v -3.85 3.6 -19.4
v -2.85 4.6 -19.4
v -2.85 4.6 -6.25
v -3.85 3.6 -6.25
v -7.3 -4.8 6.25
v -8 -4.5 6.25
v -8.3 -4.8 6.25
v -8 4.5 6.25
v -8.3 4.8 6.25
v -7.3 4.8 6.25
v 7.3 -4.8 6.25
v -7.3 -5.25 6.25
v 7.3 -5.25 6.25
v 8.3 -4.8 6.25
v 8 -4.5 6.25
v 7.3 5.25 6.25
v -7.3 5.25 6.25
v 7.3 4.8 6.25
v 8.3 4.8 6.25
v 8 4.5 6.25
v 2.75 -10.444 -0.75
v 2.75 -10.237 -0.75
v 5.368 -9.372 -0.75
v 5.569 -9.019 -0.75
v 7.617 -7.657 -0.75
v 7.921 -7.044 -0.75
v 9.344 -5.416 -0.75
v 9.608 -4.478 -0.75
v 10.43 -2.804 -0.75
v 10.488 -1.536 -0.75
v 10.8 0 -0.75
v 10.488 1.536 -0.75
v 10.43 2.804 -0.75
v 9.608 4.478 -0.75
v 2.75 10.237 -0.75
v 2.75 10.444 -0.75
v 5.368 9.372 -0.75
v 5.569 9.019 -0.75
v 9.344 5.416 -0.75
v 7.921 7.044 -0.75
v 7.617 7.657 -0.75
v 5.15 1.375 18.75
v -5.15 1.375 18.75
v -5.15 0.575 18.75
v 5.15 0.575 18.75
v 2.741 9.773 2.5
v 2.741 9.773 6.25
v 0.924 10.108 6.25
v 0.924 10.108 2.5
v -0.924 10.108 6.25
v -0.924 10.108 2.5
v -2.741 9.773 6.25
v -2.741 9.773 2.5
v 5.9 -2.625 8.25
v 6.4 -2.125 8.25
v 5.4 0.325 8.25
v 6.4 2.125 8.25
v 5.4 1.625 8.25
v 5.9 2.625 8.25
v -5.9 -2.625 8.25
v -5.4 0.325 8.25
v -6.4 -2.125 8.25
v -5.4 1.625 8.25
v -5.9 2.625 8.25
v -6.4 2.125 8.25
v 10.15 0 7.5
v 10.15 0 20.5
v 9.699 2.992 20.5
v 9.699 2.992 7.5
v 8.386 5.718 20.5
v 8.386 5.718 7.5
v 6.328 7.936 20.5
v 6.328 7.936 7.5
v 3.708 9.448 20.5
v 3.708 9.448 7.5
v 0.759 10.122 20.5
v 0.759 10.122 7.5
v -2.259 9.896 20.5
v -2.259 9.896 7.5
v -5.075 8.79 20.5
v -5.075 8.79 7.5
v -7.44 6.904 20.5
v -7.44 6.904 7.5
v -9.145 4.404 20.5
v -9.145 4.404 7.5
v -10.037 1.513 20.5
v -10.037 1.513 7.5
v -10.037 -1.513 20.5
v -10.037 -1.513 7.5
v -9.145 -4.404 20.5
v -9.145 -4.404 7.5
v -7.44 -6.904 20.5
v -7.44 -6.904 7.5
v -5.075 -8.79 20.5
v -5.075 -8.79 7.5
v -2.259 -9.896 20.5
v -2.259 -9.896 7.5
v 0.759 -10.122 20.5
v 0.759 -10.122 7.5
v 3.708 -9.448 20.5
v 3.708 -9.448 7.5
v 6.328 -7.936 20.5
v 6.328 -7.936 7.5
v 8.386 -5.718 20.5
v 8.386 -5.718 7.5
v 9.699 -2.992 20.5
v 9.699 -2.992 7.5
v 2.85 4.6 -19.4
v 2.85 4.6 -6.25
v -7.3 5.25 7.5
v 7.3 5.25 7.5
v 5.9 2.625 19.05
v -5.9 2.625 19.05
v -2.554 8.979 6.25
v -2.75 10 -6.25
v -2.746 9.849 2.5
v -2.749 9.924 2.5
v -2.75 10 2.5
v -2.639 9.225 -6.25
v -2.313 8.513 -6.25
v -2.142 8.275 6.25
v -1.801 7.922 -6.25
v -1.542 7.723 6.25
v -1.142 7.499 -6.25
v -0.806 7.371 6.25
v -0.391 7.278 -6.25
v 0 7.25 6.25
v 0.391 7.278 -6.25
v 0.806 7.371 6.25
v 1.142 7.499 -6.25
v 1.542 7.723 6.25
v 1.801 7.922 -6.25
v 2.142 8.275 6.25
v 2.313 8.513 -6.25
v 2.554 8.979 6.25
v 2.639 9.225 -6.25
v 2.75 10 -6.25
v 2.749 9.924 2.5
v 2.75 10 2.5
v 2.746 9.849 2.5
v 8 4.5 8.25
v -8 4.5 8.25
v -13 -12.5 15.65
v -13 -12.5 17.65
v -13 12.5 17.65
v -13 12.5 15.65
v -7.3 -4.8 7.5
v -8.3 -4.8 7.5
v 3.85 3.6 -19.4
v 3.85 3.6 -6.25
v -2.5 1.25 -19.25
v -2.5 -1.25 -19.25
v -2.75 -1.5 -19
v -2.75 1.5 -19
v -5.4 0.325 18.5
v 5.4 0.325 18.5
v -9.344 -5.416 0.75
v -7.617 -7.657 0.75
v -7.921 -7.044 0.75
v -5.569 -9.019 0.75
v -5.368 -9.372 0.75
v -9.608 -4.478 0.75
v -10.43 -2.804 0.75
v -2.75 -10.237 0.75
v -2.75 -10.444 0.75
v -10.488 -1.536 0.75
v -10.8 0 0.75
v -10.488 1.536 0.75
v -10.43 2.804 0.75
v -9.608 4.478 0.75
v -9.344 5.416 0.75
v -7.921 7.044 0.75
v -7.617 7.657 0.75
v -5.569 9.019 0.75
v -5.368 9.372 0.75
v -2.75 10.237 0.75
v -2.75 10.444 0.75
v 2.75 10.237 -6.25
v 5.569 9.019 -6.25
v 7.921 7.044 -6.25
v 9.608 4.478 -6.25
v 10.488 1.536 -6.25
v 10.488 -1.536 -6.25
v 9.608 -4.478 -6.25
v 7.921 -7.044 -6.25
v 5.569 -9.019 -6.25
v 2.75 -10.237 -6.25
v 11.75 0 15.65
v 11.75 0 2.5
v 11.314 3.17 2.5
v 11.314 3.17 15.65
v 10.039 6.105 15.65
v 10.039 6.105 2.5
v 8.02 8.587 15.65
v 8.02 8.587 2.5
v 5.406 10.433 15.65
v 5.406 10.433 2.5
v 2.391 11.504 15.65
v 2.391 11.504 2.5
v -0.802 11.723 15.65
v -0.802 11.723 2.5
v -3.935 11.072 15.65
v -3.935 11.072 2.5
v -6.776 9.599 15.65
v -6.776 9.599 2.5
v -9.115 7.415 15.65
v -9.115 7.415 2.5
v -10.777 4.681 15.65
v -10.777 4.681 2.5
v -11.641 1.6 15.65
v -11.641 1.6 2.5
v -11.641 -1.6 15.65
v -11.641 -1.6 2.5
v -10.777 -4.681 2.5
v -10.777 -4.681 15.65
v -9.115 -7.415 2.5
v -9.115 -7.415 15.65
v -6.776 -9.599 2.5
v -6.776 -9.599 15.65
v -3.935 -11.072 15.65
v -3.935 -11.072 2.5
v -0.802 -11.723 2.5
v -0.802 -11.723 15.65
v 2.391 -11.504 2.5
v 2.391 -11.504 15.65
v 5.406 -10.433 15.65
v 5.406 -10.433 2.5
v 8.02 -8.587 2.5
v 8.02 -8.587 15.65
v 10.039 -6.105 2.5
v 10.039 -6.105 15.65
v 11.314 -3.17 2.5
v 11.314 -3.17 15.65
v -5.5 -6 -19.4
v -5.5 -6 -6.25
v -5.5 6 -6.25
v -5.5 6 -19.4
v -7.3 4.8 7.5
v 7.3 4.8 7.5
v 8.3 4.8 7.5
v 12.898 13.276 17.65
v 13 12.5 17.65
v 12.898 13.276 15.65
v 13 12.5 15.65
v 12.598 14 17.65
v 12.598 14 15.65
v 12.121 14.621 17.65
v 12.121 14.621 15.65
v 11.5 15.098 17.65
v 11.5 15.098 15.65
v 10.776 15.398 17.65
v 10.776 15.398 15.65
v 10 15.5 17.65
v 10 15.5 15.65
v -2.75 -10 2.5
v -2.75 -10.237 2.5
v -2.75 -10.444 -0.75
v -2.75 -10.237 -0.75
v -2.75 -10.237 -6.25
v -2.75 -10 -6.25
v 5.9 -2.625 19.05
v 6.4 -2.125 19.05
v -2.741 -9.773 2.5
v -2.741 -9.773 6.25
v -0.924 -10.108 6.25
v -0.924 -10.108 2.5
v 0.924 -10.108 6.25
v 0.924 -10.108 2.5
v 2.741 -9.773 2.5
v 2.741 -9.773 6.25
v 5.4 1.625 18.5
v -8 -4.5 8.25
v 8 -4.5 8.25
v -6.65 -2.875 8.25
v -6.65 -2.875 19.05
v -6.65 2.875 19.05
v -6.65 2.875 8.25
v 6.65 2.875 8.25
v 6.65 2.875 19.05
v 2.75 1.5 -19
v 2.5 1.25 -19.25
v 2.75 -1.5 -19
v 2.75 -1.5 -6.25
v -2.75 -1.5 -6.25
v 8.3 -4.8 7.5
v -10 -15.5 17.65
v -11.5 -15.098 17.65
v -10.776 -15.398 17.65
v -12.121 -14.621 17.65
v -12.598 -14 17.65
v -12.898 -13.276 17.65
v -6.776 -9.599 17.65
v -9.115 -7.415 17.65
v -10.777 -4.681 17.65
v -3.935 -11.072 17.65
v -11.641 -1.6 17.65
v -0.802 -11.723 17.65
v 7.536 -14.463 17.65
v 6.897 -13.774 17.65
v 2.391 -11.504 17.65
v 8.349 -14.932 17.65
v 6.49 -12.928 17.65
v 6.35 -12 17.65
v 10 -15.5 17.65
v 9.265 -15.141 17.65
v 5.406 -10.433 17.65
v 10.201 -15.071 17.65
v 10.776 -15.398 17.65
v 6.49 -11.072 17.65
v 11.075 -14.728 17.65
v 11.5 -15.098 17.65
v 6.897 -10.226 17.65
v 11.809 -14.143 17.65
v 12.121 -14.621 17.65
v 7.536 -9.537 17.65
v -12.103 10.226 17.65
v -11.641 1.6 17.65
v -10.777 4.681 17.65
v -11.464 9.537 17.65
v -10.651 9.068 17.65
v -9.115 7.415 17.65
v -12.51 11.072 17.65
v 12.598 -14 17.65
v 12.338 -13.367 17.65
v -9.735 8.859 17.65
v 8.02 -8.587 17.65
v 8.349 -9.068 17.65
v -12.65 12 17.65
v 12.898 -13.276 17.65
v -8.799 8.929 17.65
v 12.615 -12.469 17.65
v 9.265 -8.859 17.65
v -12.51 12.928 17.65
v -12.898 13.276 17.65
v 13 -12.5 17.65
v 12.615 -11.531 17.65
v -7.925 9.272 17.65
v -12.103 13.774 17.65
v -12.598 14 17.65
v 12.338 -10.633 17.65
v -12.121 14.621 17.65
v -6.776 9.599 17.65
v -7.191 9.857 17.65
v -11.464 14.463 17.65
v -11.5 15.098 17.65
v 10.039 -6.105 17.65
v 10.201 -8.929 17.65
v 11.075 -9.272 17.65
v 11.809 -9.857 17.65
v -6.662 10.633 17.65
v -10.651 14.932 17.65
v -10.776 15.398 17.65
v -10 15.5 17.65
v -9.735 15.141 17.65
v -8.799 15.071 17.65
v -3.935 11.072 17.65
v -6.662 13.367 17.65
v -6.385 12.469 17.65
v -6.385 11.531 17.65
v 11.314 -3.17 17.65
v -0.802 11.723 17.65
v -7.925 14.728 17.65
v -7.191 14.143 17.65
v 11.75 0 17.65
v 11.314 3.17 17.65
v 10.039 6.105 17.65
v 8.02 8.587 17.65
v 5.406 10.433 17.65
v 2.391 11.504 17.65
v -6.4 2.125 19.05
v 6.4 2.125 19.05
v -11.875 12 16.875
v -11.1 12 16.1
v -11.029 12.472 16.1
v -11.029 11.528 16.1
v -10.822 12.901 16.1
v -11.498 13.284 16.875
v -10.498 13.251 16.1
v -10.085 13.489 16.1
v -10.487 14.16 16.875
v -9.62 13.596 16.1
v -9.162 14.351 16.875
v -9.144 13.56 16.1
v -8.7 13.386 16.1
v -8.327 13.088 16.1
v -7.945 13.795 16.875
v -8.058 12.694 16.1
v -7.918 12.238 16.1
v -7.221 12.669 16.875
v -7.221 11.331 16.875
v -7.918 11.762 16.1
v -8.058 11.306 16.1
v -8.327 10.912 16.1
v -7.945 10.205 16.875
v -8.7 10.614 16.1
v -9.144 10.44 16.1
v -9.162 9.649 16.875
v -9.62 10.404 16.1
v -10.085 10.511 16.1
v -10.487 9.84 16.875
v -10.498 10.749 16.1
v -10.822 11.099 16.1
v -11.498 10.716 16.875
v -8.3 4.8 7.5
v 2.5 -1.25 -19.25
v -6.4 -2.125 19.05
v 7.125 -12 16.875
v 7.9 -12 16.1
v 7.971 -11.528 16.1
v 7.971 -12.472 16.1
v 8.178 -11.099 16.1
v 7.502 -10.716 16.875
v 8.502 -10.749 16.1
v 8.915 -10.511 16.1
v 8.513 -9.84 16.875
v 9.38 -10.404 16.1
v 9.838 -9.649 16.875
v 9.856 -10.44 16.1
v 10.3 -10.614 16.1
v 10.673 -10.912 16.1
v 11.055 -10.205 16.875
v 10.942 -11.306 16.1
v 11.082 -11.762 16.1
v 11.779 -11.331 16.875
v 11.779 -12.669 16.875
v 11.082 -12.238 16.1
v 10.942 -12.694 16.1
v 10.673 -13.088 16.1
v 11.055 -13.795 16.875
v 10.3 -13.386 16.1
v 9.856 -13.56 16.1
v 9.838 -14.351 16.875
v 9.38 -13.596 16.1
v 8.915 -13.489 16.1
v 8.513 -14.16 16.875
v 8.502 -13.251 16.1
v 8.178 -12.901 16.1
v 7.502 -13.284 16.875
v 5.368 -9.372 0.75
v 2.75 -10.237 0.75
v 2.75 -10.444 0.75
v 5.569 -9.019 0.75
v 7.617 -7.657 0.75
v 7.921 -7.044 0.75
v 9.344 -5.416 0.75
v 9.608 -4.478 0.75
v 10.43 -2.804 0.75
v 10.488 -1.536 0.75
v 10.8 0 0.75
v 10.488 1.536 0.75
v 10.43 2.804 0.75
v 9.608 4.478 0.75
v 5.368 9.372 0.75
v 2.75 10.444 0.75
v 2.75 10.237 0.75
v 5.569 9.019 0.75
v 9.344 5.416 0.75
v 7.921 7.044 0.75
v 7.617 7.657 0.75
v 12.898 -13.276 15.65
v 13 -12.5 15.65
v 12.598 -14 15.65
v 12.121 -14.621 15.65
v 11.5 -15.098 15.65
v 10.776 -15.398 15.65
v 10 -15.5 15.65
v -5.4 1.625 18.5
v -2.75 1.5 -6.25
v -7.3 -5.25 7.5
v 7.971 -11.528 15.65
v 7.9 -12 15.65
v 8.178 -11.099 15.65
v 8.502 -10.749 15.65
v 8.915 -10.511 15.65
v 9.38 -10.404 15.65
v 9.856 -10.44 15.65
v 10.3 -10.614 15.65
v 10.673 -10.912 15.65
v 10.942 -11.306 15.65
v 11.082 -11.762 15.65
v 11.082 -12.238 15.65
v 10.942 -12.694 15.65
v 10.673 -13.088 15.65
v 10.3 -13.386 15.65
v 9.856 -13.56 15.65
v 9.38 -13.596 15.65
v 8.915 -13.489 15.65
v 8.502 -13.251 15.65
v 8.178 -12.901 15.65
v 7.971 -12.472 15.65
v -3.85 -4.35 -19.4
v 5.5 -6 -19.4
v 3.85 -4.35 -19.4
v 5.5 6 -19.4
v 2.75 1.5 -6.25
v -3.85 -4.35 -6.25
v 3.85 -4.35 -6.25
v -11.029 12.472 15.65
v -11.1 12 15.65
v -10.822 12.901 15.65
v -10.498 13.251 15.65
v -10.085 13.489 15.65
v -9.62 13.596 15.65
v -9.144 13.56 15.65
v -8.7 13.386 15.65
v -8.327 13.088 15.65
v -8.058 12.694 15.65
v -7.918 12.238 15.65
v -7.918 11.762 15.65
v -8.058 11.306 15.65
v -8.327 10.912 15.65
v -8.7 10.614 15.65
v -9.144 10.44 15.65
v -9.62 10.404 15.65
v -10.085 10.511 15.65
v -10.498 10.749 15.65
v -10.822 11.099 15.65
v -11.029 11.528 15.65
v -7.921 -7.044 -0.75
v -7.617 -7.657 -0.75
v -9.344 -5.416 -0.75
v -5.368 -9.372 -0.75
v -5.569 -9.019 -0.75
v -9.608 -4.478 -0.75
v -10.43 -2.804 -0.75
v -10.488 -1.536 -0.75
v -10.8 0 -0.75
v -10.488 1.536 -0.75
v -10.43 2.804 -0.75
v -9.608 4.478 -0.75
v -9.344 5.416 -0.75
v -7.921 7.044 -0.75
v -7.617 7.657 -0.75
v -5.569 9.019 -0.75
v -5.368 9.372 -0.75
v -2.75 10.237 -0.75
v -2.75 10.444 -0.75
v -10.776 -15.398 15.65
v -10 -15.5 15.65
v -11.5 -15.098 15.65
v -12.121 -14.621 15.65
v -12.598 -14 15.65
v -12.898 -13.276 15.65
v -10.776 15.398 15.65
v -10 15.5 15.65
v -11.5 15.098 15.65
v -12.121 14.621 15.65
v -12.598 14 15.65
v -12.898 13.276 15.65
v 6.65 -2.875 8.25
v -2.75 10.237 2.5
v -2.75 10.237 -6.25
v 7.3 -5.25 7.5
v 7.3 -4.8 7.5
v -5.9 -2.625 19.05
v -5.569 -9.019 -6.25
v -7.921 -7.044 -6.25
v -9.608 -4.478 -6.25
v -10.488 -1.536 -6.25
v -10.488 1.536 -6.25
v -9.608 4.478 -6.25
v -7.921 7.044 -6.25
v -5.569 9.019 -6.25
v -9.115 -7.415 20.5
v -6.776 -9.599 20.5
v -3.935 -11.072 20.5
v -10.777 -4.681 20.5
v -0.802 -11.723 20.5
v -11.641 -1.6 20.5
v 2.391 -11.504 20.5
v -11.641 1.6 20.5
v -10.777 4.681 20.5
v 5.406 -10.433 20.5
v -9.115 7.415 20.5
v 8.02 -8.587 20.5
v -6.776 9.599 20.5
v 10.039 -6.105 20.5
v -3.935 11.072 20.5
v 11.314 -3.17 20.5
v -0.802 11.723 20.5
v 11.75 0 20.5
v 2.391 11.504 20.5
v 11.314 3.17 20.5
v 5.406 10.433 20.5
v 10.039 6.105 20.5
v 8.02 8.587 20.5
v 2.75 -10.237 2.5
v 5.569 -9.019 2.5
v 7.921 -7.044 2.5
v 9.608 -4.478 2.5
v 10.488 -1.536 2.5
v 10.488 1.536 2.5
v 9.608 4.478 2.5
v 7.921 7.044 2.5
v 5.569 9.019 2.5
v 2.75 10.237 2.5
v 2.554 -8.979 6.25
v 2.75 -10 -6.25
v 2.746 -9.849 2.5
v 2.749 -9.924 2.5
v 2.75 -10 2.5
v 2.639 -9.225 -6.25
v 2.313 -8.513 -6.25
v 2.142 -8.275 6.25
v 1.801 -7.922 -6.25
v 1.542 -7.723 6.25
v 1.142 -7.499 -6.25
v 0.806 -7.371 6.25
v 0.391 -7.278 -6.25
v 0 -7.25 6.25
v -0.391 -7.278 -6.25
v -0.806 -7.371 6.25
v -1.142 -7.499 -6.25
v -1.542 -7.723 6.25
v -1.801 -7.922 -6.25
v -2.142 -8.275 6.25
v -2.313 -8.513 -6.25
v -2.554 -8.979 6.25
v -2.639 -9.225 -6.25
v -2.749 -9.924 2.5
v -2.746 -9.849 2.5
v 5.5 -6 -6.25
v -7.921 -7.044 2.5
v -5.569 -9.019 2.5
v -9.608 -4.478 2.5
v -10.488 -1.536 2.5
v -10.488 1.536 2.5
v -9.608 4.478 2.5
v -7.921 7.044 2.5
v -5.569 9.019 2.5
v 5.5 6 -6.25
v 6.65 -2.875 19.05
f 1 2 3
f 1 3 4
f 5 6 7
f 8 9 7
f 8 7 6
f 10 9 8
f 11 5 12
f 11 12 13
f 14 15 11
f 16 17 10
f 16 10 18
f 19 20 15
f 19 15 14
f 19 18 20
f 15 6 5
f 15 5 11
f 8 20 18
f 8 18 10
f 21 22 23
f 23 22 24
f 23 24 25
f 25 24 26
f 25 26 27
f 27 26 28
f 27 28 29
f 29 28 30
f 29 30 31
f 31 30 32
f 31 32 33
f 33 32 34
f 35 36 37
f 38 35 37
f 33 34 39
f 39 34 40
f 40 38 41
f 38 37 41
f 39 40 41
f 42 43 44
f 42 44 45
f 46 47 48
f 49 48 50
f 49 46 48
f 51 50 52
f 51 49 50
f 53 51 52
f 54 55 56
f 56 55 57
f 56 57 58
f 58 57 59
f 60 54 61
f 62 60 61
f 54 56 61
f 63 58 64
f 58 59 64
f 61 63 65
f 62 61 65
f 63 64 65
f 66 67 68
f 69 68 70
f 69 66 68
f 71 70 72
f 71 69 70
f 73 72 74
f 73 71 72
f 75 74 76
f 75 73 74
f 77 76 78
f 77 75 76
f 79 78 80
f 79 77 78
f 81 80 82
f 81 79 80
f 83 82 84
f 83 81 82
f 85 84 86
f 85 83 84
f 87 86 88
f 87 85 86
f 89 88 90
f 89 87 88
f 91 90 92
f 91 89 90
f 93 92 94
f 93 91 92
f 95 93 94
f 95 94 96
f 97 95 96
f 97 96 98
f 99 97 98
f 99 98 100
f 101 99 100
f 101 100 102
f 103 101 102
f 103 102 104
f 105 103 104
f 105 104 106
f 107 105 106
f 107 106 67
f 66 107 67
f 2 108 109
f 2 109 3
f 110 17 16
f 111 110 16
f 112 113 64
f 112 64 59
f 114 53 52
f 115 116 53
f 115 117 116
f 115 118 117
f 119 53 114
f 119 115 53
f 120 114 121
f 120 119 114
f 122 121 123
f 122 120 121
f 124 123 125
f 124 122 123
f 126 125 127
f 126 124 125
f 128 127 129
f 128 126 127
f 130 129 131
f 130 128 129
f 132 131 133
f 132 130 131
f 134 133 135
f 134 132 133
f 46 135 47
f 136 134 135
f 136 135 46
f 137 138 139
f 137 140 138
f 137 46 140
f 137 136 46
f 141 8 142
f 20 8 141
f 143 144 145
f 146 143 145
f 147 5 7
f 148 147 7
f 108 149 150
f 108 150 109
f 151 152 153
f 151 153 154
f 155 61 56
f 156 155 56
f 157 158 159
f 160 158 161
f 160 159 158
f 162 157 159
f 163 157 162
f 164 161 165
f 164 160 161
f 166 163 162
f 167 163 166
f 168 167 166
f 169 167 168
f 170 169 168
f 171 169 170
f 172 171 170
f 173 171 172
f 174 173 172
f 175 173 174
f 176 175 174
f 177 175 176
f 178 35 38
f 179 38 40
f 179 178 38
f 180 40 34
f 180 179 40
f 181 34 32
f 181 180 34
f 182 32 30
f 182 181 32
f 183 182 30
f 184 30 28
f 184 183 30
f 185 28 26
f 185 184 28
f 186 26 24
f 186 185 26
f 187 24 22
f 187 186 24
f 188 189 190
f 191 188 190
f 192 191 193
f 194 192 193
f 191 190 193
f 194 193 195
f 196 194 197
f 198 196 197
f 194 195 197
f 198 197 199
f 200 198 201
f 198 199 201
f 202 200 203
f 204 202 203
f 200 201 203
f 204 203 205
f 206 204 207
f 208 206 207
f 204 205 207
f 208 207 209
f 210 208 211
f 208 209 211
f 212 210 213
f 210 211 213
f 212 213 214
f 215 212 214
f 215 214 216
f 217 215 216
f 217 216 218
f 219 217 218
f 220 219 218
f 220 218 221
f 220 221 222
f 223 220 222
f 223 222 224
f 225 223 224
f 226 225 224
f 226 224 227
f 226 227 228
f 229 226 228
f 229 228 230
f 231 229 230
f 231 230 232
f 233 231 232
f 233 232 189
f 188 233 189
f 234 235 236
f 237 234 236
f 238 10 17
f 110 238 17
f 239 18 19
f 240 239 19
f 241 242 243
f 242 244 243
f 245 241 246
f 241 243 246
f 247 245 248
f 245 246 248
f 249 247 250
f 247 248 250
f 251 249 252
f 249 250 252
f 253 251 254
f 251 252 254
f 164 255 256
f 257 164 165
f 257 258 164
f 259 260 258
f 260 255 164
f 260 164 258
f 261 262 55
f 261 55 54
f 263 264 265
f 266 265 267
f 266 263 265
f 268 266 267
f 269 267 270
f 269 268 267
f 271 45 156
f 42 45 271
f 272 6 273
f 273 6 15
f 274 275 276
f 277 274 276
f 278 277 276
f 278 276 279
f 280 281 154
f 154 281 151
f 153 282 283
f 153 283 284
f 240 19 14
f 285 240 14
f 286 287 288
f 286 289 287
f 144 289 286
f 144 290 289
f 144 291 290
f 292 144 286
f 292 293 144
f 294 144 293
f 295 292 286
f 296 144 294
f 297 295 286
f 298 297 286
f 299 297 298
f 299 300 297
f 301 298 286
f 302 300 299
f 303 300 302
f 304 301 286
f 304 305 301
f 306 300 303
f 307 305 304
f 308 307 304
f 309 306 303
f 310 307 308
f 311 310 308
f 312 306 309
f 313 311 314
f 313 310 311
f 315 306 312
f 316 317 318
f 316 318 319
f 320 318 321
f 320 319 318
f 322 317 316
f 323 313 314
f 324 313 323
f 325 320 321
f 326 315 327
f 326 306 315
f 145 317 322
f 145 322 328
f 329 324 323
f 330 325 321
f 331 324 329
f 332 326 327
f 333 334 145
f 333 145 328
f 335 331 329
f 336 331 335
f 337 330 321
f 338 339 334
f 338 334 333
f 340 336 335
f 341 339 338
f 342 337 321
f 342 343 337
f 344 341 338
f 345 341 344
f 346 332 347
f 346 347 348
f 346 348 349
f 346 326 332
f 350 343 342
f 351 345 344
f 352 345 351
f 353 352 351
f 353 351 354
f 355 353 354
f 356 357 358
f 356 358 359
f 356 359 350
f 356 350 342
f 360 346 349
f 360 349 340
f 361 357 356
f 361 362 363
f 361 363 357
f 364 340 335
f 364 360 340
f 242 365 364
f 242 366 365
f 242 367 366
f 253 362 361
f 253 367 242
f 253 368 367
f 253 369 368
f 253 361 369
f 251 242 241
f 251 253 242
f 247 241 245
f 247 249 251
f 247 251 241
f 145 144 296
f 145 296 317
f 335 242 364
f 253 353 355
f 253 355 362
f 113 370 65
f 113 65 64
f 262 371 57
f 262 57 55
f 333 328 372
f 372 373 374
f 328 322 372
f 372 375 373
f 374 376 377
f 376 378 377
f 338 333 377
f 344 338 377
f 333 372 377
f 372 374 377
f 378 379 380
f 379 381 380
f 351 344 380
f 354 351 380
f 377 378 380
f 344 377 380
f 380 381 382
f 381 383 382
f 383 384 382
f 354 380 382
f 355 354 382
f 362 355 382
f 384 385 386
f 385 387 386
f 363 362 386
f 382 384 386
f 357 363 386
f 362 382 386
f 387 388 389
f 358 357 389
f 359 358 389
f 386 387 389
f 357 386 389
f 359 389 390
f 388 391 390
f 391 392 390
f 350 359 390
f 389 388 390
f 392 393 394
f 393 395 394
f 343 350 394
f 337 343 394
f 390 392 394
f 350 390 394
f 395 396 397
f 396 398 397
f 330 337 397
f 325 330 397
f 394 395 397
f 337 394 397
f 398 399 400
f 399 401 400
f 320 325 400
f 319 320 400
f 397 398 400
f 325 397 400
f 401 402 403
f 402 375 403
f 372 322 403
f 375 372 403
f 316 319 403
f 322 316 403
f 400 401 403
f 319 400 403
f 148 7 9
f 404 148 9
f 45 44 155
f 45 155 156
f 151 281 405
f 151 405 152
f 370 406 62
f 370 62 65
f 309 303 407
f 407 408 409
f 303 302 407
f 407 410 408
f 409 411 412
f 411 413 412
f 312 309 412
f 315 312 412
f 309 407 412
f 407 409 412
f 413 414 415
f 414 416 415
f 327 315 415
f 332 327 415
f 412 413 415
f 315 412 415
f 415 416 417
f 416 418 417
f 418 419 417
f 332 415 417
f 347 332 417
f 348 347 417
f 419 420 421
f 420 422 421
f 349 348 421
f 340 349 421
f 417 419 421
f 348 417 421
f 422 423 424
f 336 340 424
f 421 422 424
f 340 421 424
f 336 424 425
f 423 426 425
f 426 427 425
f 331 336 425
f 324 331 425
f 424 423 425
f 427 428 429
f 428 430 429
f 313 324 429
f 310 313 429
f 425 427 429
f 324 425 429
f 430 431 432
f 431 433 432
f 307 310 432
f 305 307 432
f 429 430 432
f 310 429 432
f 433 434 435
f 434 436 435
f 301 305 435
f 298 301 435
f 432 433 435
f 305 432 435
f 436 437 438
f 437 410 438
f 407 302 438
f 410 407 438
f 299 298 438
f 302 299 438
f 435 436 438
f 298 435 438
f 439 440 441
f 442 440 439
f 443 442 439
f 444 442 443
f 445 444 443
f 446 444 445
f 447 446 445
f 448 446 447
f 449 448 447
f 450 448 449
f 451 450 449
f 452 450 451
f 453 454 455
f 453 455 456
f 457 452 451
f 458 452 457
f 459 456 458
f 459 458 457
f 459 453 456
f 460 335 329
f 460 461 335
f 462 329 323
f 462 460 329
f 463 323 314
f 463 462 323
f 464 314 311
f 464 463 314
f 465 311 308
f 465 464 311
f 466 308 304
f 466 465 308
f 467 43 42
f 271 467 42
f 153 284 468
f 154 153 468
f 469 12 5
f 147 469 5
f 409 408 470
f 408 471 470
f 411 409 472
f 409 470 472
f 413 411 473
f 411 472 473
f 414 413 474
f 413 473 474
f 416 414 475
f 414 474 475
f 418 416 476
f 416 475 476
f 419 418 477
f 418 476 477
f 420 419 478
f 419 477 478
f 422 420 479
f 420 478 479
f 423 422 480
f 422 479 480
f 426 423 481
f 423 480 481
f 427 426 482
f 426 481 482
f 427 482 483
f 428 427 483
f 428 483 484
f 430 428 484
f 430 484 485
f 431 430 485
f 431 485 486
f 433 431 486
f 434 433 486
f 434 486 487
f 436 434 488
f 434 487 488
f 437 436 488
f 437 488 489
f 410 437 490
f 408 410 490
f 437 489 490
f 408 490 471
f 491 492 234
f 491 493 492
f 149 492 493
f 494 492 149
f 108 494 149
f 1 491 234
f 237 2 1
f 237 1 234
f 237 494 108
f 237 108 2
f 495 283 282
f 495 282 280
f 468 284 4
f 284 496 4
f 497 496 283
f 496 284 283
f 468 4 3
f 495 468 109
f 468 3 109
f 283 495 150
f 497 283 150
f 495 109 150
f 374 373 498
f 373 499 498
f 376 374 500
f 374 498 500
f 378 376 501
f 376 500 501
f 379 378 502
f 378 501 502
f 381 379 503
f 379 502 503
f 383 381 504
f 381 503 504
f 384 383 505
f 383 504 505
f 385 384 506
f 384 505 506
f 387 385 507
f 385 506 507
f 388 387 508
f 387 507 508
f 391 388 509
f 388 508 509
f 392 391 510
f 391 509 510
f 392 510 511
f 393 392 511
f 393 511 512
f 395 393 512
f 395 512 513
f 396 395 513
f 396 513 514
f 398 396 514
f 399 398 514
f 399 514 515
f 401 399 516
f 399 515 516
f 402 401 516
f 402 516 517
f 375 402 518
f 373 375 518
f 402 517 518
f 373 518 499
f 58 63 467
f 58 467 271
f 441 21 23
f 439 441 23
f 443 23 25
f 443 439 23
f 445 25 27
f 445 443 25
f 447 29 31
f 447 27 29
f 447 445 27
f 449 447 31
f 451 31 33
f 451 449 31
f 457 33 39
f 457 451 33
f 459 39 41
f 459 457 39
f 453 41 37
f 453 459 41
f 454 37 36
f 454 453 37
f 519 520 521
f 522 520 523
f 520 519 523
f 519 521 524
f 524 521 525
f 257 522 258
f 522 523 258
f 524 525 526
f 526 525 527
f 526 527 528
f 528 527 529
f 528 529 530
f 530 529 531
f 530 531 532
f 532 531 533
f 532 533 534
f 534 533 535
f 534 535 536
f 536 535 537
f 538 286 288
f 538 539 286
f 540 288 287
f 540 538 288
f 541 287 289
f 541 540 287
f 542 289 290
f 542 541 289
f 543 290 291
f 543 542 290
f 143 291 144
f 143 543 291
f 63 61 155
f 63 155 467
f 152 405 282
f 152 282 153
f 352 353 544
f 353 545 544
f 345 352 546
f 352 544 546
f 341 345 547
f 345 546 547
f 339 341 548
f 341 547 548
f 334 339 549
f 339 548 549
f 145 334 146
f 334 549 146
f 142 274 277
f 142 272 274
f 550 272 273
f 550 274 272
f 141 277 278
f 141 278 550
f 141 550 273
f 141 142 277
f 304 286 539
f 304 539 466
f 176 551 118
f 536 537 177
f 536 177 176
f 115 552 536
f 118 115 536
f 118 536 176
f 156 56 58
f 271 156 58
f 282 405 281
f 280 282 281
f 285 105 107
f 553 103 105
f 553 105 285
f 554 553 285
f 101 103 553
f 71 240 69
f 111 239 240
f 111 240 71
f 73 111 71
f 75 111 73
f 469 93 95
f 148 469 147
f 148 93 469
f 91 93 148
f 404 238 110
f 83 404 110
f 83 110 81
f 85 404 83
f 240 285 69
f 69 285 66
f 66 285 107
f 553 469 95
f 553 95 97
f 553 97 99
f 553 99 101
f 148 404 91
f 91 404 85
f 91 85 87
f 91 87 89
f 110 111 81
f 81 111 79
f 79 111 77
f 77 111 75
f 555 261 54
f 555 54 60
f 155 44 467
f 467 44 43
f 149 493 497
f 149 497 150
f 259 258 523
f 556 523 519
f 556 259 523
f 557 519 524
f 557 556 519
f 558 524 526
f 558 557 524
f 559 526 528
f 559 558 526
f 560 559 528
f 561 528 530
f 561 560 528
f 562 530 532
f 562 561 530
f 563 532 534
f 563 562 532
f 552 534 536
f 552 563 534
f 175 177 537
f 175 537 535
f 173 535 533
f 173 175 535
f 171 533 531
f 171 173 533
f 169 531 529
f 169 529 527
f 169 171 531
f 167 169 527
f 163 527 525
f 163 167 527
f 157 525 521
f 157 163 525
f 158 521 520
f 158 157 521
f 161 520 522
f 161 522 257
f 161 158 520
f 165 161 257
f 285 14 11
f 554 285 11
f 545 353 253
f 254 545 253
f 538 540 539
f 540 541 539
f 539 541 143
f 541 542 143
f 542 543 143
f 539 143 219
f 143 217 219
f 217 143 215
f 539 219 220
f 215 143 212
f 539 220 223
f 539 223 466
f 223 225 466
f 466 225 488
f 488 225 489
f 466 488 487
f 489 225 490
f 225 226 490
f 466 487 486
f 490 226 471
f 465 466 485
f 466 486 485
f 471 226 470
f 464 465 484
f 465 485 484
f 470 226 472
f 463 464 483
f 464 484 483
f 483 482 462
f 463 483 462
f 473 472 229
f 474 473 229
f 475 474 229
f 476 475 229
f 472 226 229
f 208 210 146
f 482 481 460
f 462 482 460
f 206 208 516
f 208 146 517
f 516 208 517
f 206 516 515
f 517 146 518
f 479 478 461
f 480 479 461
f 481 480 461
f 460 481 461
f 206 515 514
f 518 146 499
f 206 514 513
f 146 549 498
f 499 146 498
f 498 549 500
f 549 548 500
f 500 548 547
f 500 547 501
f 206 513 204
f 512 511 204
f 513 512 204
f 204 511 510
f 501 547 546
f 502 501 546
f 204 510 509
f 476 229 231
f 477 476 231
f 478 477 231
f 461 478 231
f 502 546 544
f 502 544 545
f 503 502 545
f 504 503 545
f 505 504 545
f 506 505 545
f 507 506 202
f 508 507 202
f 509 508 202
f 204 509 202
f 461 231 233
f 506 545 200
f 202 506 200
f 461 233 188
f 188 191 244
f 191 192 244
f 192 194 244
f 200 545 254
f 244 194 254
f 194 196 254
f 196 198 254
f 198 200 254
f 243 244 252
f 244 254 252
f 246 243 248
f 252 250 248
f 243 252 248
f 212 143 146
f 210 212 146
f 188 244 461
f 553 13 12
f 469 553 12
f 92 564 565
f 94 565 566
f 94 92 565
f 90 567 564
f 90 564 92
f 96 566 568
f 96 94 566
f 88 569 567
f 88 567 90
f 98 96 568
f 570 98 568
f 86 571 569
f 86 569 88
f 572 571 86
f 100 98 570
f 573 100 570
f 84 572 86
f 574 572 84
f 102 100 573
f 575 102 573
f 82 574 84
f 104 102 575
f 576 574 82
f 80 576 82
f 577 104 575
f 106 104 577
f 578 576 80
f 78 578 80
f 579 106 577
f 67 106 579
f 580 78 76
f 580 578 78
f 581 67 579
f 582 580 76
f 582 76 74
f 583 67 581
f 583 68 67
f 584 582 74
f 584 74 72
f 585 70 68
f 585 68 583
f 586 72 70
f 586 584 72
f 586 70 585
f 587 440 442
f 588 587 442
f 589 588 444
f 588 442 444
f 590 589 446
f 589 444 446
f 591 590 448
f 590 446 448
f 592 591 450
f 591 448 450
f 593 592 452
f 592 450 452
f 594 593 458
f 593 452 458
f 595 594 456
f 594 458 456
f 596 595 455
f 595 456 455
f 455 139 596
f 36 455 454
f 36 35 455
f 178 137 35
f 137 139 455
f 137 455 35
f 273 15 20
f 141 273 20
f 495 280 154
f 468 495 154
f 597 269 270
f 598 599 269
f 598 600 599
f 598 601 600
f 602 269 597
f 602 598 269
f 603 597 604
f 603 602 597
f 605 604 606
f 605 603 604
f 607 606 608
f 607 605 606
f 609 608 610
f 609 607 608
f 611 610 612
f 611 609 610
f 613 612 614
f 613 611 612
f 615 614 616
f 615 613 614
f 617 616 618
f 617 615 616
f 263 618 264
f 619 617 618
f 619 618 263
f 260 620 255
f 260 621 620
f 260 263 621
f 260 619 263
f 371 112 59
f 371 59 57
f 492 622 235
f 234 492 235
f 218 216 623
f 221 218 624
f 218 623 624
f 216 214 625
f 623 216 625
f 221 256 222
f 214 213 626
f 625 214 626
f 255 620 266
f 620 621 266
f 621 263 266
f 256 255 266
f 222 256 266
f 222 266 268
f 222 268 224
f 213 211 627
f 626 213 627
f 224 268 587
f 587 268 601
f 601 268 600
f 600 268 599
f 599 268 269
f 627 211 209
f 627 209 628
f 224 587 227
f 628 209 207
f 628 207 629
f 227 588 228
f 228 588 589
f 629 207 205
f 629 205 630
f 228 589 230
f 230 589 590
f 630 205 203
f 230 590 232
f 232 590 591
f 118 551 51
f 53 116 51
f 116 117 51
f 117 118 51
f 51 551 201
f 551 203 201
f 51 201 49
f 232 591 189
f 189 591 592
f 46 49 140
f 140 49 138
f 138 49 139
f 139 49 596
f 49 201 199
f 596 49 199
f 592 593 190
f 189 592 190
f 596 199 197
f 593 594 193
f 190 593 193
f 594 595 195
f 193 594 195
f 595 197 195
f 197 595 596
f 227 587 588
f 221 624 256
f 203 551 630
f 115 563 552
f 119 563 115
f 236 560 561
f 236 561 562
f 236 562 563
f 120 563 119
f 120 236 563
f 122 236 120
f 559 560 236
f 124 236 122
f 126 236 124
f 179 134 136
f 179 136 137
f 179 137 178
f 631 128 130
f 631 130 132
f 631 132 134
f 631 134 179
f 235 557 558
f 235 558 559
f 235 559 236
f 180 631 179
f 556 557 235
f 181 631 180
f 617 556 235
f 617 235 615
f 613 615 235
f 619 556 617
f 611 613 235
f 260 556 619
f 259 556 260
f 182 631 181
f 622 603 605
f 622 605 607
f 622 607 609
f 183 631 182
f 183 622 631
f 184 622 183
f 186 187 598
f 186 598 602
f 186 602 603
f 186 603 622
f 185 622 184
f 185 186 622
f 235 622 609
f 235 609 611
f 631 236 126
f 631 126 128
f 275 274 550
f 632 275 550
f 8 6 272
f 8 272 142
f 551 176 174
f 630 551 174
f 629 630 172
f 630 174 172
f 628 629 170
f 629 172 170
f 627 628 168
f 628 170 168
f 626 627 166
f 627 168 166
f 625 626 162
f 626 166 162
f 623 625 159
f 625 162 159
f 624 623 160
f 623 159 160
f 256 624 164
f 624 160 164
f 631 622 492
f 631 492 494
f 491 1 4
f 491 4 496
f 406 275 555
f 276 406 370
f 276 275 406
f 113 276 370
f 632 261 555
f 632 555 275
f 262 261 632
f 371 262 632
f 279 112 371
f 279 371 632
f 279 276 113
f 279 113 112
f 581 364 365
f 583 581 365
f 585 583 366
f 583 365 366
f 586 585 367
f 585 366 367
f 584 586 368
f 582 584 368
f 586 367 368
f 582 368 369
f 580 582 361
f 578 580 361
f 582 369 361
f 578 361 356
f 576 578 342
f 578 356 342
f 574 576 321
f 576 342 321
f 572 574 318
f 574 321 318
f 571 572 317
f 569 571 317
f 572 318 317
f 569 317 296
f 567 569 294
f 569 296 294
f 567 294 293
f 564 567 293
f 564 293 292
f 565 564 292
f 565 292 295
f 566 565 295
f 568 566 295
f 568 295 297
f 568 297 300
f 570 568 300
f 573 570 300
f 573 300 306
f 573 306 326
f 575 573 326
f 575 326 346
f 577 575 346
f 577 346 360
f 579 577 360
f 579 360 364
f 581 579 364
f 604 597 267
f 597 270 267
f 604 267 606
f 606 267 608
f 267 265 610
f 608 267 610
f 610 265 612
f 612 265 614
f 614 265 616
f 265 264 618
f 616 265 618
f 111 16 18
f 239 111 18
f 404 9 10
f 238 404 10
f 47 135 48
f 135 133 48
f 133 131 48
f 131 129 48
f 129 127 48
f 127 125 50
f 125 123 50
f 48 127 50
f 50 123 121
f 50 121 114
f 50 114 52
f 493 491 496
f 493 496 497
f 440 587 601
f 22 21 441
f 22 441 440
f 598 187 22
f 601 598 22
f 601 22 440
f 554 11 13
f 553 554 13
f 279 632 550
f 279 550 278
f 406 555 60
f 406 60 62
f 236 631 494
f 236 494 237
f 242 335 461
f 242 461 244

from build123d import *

# Parameters (mm, degrees)
SKETCH1_R                                     = 10.8
EXTRUDE1_DEPTH                                = 0.75
SKETCH2_R                                     = 10.6
EXTRUDE2_DEPTH                                = 5.5
EXTRUDE3_START                                = 5.5
SKETCH3_R                                     = 10.6
EXTRUDE3_DEPTH                                = 5.5
SKETCH4_W                                     = 16
SKETCH4_H                                     = 9
EXTRUDE4_DEPTH                                = 2
SKETCH5_W                                     = 13.3
SKETCH5_H                                     = 5.75
EXTRUDE5_DEPTH                                = 10.8
EXTRUDE6_DEPTH                                = 10.8
SKETCH7_W                                     = 10.8
SKETCH7_H                                     = 1.3
EXTRUDE7_DEPTH                                = 10.5
CHAMFER1_SIZE                                 = 0.25
SKETCH8_W                                     = 11
SKETCH8_H                                     = 12
EXTRUDE8_DEPTH                                = 13.15
EXTRUDE9_DEPTH                                = 13.15
SKETCH10_W                                    = 5.5
SKETCH10_H                                    = 3
EXTRUDE10_DEPTH                               = 13
CHAMFER2_SIZE                                 = 0.25
EXTRUDE11_DEPTH                               = 30.552834043
SKETCH12_R                                    = 10.15
EXTRUDE12_DEPTH                               = 1.25
EXTRUDE13_DEPTH                               = 13
EXTRUDE13_DEPTH_BACK                          = 5
SKETCH13_R                                    = 11.75
SKETCH13_R_2                                  = 10.15
SKETCH14_W                                    = 26
SKETCH14_H                                    = 31
SKETCH14_R                                    = 11.75
EXTRUDE14_DEPTH                               = 2
CSK_FOR_M3_COUNTERSUNK_FLAT_HEAD1_D           = 3.2
CSK_FOR_M3_COUNTERSUNK_FLAT_HEAD1_CSINK_D     = 6.3
CSK_FOR_M3_COUNTERSUNK_FLAT_HEAD1_CSINK_ANGLE = 90
FILLET1_R                                     = 3


with BuildPart() as part:
    # Sketch1 → Extrude1 (new, symmetric)
    with BuildSketch(Plane.XY):
        Circle(SKETCH1_R)
    extrude(amount=EXTRUDE1_DEPTH, both=True)

    # Sketch2 → Extrude2 (add)
    with BuildSketch(Plane.XY.offset(0.75)):
        Circle(SKETCH2_R)
    extrude(amount=EXTRUDE2_DEPTH)

    # Sketch3 → Extrude3 (add)
    with BuildSketch(Plane(origin=(0, 0, -0.75), x_dir=(-1, 0, 0), z_dir=(0, 0, -1)).offset(EXTRUDE3_START)):
        with Locations(Location((0, 0, 0), (0, 0, 180))):
            Circle(SKETCH3_R)
    extrude(amount=-EXTRUDE3_DEPTH)

    # Sketch4 → Extrude4 (add)
    with BuildSketch(Plane.XY.offset(6.25)):
        Rectangle(SKETCH4_W, SKETCH4_H)
    extrude(amount=EXTRUDE4_DEPTH)

    # Sketch5 → Extrude5 (add)
    with BuildSketch(Plane.XY.offset(8.25)):
        Rectangle(SKETCH5_W, SKETCH5_H)
    extrude(amount=EXTRUDE5_DEPTH)

    # Sketch6 → Extrude6 (cut)
    with BuildSketch(Plane.XY.offset(19.05)):
        Polygon((-5.9, 2.625), (5.9, 2.625), (6.4, 2.125), (6.4, -2.125), (5.9, -2.625), (-5.9, -2.625), (-6.4, -2.125), (-6.4, 2.125), align=None)
    extrude(amount=-EXTRUDE6_DEPTH, mode=Mode.SUBTRACT)

    # Sketch7 → Extrude7 (add)
    with BuildSketch(Plane.XY.offset(8.25)):
        with Locations((0, 0.975)):
            Rectangle(SKETCH7_W, SKETCH7_H)
    extrude(amount=EXTRUDE7_DEPTH)

    # Chamfer1
    chamfer1_edges = [part.edges().sort_by_distance(p)[0] for p in [
        (-5.4, 0.975, 18.75),
        (0, 0.325, 18.75),
        (5.4, 0.975, 18.75),
        (0, 1.625, 18.75),
    ]]
    chamfer(chamfer1_edges, length=CHAMFER1_SIZE)

    # Sketch8 → Extrude8 (add)
    with BuildSketch(Plane(origin=(0, 0, -6.25), x_dir=(-1, 0, 0), z_dir=(0, 0, -1))):
        Rectangle(SKETCH8_W, SKETCH8_H)
    extrude(amount=EXTRUDE8_DEPTH)

    # Sketch9 → Extrude9 (cut)
    with BuildSketch(Plane(origin=(0, 0, -19.4), x_dir=(-1, 0, 0), z_dir=(0, 0, -1))):
        Polygon((-2.85, 4.6), (2.85, 4.6), (3.85, 3.6), (3.85, -4.35), (-3.85, -4.35), (-3.85, 3.6), align=None)
    extrude(amount=-EXTRUDE9_DEPTH, mode=Mode.SUBTRACT)

    # Sketch10 → Extrude10 (add)
    with BuildSketch(Plane(origin=(0, 0, -6.25), x_dir=(-1, 0, 0), z_dir=(0, 0, -1))):
        Rectangle(SKETCH10_W, SKETCH10_H)
    extrude(amount=EXTRUDE10_DEPTH)

    # Chamfer2
    chamfer2_edges = [part.edges().sort_by_distance(p)[0] for p in [
        (2.75, 0, -19.25),
        (0, -1.5, -19.25),
        (-2.75, 0, -19.25),
        (0, 1.5, -19.25),
    ]]
    chamfer(chamfer2_edges, length=CHAMFER2_SIZE)

    # Sketch11 → Extrude11 (cut, through all)
    with BuildSketch(Plane(origin=(0, 0, -6.25), x_dir=(-1, 0, 0), z_dir=(0, 0, -1))):
        with BuildLine():
            Line((-2.75, 10), (-2.75, 10.444017426))
            ThreePointArc((-2.75, 10.444017426), (0, 10.8), (2.75, 10.444017426))
            Line((2.75, 10.444017426), (2.75, 10))
            ThreePointArc((2.75, 10), (0, 7.25), (-2.75, 10))
        make_face()
        with BuildLine():
            Line((-2.75, -10.444017426), (-2.75, -10))
            ThreePointArc((-2.75, -10), (0, -7.25), (2.75, -10))
            Line((2.75, -10), (2.75, -10.444017426))
            ThreePointArc((2.75, -10.444017426), (0, -10.8), (-2.75, -10.444017426))
        make_face()
    extrude(amount=-EXTRUDE11_DEPTH, mode=Mode.SUBTRACT)

    # Sketch12 → Extrude12 (add)
    with BuildSketch(Plane.XY.offset(6.25)):
        with Locations(Location((0, 0, 0), (0, 0, 105.664941507))):
            Circle(SKETCH12_R)
        Polygon((7.3, 4.8), (8.3, 4.8), (8.3, -4.8), (7.3, -4.8), (7.3, -5.25), (-7.3, -5.25), (-7.3, -4.8), (-8.3, -4.8), (-8.3, 4.8), (-7.3, 4.8), (-7.3, 5.25), (7.3, 5.25), align=None, mode=Mode.SUBTRACT)
    extrude(amount=EXTRUDE12_DEPTH)

    # Sketch13 → Extrude13 (add, two sides: drawn at the far end of the back side and taken through both)
    with BuildSketch(Plane.XY.offset(7.5).offset(-EXTRUDE13_DEPTH_BACK)):
        Circle(SKETCH13_R)
        Circle(SKETCH13_R_2, mode=Mode.SUBTRACT)
    extrude(amount=EXTRUDE13_DEPTH + EXTRUDE13_DEPTH_BACK)

    # Sketch14 → Extrude14 (add)
    with BuildSketch(Plane.XY.offset(17.65)):
        Rectangle(SKETCH14_W, SKETCH14_H)
        Circle(SKETCH14_R, mode=Mode.SUBTRACT)
    extrude(amount=-EXTRUDE14_DEPTH)

    # CSK for M3 Countersunk Flat Head1 (through all)
    with Locations(Plane.XY.offset(17.65)):
        with Locations((-9.5, 12), (9.5, -12)):
            CounterSinkHole(CSK_FOR_M3_COUNTERSUNK_FLAT_HEAD1_D / 2, CSK_FOR_M3_COUNTERSUNK_FLAT_HEAD1_CSINK_D / 2, counter_sink_angle=CSK_FOR_M3_COUNTERSUNK_FLAT_HEAD1_CSINK_ANGLE)

    # Fillet1
    fillet1_edges = [part.edges().sort_by_distance(p)[0] for p in [
        (-13, -15.5, 16.65),
        (-13, 15.5, 16.65),
        (13, 15.5, 16.65),
        (13, -15.5, 16.65),
    ]]
    fillet(fillet1_edges, radius=FILLET1_R)


solid = part.part
